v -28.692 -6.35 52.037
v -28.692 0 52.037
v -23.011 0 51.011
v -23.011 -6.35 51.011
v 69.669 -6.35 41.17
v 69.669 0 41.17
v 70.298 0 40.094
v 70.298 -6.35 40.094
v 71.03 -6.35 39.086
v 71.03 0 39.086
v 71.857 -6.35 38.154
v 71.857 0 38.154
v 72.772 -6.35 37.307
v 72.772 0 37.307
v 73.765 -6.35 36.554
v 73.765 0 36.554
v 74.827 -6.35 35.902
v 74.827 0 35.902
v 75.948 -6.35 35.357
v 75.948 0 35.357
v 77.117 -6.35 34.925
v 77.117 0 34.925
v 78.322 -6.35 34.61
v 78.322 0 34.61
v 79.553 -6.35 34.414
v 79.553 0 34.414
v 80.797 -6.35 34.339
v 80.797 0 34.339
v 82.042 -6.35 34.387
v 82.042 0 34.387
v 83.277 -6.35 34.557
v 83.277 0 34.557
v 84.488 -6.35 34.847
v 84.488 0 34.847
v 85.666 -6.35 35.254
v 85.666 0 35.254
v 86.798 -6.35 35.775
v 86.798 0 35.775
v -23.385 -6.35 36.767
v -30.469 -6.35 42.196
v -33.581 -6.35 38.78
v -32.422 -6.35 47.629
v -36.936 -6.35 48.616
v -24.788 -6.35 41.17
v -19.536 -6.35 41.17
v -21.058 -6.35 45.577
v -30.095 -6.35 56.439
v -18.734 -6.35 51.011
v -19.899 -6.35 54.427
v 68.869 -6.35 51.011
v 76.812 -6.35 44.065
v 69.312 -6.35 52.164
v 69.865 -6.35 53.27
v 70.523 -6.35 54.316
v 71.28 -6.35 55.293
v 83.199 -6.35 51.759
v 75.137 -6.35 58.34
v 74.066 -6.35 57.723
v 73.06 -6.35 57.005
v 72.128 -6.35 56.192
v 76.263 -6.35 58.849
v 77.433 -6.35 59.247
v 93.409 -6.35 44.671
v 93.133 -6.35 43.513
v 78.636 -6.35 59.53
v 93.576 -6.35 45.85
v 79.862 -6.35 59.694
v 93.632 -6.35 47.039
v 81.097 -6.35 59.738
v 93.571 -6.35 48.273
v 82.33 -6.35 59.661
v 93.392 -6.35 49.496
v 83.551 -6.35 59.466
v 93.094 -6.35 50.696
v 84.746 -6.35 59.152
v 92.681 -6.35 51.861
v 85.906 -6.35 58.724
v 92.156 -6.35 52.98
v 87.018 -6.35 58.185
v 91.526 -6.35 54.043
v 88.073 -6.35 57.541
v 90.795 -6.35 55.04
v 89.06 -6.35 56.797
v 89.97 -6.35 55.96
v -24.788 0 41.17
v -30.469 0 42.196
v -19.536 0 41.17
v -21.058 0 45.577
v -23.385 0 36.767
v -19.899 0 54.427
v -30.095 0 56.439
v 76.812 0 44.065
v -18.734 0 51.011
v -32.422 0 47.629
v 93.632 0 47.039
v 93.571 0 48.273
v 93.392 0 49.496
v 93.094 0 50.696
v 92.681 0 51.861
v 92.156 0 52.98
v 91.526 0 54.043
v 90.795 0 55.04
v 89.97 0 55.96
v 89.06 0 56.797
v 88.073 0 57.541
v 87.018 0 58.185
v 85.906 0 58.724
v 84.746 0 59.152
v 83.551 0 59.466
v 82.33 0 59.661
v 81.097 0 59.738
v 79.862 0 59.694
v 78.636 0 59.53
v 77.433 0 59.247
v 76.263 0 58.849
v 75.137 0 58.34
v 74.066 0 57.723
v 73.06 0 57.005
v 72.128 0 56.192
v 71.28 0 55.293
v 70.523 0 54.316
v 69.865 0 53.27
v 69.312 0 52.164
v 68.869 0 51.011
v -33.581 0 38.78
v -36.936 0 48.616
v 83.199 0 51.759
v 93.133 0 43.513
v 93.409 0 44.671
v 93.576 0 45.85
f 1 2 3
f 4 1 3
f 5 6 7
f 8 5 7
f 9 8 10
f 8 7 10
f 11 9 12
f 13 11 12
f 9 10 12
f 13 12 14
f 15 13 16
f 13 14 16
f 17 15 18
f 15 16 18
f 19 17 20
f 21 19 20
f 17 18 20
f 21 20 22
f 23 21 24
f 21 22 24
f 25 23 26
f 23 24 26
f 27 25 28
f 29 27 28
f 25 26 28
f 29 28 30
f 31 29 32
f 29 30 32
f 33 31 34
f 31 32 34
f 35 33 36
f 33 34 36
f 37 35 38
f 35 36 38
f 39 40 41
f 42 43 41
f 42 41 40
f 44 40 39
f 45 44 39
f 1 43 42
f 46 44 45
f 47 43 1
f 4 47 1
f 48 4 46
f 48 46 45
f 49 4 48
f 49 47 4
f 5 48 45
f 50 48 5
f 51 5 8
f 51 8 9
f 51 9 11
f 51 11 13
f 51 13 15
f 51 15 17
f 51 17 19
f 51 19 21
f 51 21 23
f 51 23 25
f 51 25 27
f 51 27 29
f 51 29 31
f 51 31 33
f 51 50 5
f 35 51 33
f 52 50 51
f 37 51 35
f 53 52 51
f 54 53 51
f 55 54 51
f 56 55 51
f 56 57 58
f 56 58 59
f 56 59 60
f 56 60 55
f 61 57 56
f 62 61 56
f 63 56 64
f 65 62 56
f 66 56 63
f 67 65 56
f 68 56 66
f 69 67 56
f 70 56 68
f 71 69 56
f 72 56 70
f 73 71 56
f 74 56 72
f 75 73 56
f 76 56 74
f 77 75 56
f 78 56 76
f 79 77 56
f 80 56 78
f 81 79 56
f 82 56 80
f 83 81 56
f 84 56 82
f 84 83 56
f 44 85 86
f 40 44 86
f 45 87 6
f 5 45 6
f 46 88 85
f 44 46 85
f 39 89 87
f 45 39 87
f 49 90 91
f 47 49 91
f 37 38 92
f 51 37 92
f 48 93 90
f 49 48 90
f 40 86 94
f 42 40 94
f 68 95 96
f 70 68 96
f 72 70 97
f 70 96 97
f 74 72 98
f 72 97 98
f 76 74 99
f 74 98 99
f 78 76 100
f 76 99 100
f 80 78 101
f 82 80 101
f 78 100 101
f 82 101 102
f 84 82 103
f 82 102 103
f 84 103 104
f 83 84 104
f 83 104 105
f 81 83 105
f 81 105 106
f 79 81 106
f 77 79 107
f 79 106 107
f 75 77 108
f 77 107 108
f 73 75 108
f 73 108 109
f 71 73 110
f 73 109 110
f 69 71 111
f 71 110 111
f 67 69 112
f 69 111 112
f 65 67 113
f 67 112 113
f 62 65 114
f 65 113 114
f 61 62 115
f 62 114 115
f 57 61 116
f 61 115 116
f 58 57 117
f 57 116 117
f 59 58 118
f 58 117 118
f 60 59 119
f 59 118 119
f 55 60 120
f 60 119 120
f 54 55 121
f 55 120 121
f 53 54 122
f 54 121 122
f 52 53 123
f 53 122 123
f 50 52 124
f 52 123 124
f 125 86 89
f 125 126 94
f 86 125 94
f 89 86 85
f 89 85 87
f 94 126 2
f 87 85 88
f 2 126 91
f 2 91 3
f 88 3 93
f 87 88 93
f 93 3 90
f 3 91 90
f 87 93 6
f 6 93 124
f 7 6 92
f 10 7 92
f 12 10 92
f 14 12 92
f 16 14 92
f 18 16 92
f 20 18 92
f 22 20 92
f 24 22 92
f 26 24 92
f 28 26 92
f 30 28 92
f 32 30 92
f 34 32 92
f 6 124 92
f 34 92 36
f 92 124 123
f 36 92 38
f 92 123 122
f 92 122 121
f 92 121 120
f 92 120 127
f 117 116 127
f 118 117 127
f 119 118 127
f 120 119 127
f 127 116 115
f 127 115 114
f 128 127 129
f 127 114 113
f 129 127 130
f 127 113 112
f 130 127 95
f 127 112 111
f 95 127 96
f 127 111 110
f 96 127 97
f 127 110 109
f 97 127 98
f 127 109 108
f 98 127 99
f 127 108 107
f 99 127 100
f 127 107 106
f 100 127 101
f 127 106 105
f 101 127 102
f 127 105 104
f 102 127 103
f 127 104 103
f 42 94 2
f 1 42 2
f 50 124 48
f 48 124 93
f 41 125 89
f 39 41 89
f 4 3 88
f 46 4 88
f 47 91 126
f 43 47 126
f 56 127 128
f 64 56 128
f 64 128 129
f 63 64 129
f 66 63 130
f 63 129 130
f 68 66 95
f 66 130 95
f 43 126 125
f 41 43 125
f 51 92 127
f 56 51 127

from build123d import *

# Parameters (mm, degrees)
F1_DEPTH = 6.35


with BuildPart() as f1:
    # F0 (on Front) → F1 (new body)
    with BuildSketch(Plane.XZ):
        with BuildLine():
            Line((-19.535648028, 41.1698554981), (69.6690051493, 41.1698554981))
            ThreePointArc((69.6690051493, 41.1698554981), (68.2734107375, 46.0093179877), (68.8687306625, 51.0106853144))
            Line((68.8687306625, 51.0106853144), (-18.7341859771, 51.0106853144))
            Line((-18.7341859771, 51.0106853144), (-16.544501635, 44.5905560083))
            Line((-16.544501635, 44.5905560083), (-19.535648028, 41.1698554981))
        make_face()
        with BuildLine():
            ThreePointArc((68.8687306625, 51.0106853144), (68.2734107375, 46.0093179877), (69.6690051493, 41.1698554981))
            Line((69.6690051493, 41.1698554981), (76.8122168252, 41.1698554981))
            Line((76.8122168252, 41.1698554981), (76.8122168252, 44.0645504642))
            Line((76.8122168252, 44.0645504642), (76.8122168252, 51.0106853144))
            Line((76.8122168252, 51.0106853144), (68.8687306625, 51.0106853144))
        make_face()
        with BuildLine():
            Line((83.1993854847, 51.7589689942), (93.1325389176, 43.5134172284))
            ThreePointArc((93.1325389176, 43.5134172284), (93.506233567, 45.2584856945), (93.6316237892, 47.0387072915))
            ThreePointArc((93.6316237892, 47.0387072915), (82.942998604, 59.5784190647), (68.8687306625, 51.0106853144))
            Line((68.8687306625, 51.0106853144), (76.8122168252, 51.0106853144))
            Line((76.8122168252, 51.0106853144), (76.8122168252, 44.0645504642))
            Line((76.8122168252, 44.0645504642), (83.1993854847, 51.7589689942))
        make_face()
        with BuildLine():
            ThreePointArc((69.6690051493, 41.1698554981), (77.1165270466, 34.9252834632), (86.7983786546, 35.7749962091))
            Line((86.7983786546, 35.7749962091), (76.8122168252, 44.0645504642))
            Line((76.8122168252, 44.0645504642), (76.8122168252, 41.1698554981))
            Line((76.8122168252, 41.1698554981), (69.6690051493, 41.1698554981))
        make_face()
        Polygon((-24.7877831748, 41.1698554981), (-19.535648028, 41.1698554981), (-16.544501635, 44.5905560083), (-18.7341859771, 51.0106853144), (-23.0106876439, 51.0106853144), (-21.0584325376, 45.5772671147), align=None)
        Polygon((-23.3853346079, 36.7673211123), (-19.535648028, 41.1698554981), (-24.7877831748, 41.1698554981), (-30.4693889183, 42.1958620812), (-32.4216440246, 47.629280281), (-28.6922933874, 52.0366918976), (-23.0106876439, 51.0106853144), (-18.7341859771, 51.0106853144), (-19.8992053083, 54.4265085938), (-30.0947419544, 56.4392262833), (-36.9355749272, 48.6159913874), (-33.580871254, 38.7800388019), align=None)
    extrude(amount=F1_DEPTH)


solid = f1.part
